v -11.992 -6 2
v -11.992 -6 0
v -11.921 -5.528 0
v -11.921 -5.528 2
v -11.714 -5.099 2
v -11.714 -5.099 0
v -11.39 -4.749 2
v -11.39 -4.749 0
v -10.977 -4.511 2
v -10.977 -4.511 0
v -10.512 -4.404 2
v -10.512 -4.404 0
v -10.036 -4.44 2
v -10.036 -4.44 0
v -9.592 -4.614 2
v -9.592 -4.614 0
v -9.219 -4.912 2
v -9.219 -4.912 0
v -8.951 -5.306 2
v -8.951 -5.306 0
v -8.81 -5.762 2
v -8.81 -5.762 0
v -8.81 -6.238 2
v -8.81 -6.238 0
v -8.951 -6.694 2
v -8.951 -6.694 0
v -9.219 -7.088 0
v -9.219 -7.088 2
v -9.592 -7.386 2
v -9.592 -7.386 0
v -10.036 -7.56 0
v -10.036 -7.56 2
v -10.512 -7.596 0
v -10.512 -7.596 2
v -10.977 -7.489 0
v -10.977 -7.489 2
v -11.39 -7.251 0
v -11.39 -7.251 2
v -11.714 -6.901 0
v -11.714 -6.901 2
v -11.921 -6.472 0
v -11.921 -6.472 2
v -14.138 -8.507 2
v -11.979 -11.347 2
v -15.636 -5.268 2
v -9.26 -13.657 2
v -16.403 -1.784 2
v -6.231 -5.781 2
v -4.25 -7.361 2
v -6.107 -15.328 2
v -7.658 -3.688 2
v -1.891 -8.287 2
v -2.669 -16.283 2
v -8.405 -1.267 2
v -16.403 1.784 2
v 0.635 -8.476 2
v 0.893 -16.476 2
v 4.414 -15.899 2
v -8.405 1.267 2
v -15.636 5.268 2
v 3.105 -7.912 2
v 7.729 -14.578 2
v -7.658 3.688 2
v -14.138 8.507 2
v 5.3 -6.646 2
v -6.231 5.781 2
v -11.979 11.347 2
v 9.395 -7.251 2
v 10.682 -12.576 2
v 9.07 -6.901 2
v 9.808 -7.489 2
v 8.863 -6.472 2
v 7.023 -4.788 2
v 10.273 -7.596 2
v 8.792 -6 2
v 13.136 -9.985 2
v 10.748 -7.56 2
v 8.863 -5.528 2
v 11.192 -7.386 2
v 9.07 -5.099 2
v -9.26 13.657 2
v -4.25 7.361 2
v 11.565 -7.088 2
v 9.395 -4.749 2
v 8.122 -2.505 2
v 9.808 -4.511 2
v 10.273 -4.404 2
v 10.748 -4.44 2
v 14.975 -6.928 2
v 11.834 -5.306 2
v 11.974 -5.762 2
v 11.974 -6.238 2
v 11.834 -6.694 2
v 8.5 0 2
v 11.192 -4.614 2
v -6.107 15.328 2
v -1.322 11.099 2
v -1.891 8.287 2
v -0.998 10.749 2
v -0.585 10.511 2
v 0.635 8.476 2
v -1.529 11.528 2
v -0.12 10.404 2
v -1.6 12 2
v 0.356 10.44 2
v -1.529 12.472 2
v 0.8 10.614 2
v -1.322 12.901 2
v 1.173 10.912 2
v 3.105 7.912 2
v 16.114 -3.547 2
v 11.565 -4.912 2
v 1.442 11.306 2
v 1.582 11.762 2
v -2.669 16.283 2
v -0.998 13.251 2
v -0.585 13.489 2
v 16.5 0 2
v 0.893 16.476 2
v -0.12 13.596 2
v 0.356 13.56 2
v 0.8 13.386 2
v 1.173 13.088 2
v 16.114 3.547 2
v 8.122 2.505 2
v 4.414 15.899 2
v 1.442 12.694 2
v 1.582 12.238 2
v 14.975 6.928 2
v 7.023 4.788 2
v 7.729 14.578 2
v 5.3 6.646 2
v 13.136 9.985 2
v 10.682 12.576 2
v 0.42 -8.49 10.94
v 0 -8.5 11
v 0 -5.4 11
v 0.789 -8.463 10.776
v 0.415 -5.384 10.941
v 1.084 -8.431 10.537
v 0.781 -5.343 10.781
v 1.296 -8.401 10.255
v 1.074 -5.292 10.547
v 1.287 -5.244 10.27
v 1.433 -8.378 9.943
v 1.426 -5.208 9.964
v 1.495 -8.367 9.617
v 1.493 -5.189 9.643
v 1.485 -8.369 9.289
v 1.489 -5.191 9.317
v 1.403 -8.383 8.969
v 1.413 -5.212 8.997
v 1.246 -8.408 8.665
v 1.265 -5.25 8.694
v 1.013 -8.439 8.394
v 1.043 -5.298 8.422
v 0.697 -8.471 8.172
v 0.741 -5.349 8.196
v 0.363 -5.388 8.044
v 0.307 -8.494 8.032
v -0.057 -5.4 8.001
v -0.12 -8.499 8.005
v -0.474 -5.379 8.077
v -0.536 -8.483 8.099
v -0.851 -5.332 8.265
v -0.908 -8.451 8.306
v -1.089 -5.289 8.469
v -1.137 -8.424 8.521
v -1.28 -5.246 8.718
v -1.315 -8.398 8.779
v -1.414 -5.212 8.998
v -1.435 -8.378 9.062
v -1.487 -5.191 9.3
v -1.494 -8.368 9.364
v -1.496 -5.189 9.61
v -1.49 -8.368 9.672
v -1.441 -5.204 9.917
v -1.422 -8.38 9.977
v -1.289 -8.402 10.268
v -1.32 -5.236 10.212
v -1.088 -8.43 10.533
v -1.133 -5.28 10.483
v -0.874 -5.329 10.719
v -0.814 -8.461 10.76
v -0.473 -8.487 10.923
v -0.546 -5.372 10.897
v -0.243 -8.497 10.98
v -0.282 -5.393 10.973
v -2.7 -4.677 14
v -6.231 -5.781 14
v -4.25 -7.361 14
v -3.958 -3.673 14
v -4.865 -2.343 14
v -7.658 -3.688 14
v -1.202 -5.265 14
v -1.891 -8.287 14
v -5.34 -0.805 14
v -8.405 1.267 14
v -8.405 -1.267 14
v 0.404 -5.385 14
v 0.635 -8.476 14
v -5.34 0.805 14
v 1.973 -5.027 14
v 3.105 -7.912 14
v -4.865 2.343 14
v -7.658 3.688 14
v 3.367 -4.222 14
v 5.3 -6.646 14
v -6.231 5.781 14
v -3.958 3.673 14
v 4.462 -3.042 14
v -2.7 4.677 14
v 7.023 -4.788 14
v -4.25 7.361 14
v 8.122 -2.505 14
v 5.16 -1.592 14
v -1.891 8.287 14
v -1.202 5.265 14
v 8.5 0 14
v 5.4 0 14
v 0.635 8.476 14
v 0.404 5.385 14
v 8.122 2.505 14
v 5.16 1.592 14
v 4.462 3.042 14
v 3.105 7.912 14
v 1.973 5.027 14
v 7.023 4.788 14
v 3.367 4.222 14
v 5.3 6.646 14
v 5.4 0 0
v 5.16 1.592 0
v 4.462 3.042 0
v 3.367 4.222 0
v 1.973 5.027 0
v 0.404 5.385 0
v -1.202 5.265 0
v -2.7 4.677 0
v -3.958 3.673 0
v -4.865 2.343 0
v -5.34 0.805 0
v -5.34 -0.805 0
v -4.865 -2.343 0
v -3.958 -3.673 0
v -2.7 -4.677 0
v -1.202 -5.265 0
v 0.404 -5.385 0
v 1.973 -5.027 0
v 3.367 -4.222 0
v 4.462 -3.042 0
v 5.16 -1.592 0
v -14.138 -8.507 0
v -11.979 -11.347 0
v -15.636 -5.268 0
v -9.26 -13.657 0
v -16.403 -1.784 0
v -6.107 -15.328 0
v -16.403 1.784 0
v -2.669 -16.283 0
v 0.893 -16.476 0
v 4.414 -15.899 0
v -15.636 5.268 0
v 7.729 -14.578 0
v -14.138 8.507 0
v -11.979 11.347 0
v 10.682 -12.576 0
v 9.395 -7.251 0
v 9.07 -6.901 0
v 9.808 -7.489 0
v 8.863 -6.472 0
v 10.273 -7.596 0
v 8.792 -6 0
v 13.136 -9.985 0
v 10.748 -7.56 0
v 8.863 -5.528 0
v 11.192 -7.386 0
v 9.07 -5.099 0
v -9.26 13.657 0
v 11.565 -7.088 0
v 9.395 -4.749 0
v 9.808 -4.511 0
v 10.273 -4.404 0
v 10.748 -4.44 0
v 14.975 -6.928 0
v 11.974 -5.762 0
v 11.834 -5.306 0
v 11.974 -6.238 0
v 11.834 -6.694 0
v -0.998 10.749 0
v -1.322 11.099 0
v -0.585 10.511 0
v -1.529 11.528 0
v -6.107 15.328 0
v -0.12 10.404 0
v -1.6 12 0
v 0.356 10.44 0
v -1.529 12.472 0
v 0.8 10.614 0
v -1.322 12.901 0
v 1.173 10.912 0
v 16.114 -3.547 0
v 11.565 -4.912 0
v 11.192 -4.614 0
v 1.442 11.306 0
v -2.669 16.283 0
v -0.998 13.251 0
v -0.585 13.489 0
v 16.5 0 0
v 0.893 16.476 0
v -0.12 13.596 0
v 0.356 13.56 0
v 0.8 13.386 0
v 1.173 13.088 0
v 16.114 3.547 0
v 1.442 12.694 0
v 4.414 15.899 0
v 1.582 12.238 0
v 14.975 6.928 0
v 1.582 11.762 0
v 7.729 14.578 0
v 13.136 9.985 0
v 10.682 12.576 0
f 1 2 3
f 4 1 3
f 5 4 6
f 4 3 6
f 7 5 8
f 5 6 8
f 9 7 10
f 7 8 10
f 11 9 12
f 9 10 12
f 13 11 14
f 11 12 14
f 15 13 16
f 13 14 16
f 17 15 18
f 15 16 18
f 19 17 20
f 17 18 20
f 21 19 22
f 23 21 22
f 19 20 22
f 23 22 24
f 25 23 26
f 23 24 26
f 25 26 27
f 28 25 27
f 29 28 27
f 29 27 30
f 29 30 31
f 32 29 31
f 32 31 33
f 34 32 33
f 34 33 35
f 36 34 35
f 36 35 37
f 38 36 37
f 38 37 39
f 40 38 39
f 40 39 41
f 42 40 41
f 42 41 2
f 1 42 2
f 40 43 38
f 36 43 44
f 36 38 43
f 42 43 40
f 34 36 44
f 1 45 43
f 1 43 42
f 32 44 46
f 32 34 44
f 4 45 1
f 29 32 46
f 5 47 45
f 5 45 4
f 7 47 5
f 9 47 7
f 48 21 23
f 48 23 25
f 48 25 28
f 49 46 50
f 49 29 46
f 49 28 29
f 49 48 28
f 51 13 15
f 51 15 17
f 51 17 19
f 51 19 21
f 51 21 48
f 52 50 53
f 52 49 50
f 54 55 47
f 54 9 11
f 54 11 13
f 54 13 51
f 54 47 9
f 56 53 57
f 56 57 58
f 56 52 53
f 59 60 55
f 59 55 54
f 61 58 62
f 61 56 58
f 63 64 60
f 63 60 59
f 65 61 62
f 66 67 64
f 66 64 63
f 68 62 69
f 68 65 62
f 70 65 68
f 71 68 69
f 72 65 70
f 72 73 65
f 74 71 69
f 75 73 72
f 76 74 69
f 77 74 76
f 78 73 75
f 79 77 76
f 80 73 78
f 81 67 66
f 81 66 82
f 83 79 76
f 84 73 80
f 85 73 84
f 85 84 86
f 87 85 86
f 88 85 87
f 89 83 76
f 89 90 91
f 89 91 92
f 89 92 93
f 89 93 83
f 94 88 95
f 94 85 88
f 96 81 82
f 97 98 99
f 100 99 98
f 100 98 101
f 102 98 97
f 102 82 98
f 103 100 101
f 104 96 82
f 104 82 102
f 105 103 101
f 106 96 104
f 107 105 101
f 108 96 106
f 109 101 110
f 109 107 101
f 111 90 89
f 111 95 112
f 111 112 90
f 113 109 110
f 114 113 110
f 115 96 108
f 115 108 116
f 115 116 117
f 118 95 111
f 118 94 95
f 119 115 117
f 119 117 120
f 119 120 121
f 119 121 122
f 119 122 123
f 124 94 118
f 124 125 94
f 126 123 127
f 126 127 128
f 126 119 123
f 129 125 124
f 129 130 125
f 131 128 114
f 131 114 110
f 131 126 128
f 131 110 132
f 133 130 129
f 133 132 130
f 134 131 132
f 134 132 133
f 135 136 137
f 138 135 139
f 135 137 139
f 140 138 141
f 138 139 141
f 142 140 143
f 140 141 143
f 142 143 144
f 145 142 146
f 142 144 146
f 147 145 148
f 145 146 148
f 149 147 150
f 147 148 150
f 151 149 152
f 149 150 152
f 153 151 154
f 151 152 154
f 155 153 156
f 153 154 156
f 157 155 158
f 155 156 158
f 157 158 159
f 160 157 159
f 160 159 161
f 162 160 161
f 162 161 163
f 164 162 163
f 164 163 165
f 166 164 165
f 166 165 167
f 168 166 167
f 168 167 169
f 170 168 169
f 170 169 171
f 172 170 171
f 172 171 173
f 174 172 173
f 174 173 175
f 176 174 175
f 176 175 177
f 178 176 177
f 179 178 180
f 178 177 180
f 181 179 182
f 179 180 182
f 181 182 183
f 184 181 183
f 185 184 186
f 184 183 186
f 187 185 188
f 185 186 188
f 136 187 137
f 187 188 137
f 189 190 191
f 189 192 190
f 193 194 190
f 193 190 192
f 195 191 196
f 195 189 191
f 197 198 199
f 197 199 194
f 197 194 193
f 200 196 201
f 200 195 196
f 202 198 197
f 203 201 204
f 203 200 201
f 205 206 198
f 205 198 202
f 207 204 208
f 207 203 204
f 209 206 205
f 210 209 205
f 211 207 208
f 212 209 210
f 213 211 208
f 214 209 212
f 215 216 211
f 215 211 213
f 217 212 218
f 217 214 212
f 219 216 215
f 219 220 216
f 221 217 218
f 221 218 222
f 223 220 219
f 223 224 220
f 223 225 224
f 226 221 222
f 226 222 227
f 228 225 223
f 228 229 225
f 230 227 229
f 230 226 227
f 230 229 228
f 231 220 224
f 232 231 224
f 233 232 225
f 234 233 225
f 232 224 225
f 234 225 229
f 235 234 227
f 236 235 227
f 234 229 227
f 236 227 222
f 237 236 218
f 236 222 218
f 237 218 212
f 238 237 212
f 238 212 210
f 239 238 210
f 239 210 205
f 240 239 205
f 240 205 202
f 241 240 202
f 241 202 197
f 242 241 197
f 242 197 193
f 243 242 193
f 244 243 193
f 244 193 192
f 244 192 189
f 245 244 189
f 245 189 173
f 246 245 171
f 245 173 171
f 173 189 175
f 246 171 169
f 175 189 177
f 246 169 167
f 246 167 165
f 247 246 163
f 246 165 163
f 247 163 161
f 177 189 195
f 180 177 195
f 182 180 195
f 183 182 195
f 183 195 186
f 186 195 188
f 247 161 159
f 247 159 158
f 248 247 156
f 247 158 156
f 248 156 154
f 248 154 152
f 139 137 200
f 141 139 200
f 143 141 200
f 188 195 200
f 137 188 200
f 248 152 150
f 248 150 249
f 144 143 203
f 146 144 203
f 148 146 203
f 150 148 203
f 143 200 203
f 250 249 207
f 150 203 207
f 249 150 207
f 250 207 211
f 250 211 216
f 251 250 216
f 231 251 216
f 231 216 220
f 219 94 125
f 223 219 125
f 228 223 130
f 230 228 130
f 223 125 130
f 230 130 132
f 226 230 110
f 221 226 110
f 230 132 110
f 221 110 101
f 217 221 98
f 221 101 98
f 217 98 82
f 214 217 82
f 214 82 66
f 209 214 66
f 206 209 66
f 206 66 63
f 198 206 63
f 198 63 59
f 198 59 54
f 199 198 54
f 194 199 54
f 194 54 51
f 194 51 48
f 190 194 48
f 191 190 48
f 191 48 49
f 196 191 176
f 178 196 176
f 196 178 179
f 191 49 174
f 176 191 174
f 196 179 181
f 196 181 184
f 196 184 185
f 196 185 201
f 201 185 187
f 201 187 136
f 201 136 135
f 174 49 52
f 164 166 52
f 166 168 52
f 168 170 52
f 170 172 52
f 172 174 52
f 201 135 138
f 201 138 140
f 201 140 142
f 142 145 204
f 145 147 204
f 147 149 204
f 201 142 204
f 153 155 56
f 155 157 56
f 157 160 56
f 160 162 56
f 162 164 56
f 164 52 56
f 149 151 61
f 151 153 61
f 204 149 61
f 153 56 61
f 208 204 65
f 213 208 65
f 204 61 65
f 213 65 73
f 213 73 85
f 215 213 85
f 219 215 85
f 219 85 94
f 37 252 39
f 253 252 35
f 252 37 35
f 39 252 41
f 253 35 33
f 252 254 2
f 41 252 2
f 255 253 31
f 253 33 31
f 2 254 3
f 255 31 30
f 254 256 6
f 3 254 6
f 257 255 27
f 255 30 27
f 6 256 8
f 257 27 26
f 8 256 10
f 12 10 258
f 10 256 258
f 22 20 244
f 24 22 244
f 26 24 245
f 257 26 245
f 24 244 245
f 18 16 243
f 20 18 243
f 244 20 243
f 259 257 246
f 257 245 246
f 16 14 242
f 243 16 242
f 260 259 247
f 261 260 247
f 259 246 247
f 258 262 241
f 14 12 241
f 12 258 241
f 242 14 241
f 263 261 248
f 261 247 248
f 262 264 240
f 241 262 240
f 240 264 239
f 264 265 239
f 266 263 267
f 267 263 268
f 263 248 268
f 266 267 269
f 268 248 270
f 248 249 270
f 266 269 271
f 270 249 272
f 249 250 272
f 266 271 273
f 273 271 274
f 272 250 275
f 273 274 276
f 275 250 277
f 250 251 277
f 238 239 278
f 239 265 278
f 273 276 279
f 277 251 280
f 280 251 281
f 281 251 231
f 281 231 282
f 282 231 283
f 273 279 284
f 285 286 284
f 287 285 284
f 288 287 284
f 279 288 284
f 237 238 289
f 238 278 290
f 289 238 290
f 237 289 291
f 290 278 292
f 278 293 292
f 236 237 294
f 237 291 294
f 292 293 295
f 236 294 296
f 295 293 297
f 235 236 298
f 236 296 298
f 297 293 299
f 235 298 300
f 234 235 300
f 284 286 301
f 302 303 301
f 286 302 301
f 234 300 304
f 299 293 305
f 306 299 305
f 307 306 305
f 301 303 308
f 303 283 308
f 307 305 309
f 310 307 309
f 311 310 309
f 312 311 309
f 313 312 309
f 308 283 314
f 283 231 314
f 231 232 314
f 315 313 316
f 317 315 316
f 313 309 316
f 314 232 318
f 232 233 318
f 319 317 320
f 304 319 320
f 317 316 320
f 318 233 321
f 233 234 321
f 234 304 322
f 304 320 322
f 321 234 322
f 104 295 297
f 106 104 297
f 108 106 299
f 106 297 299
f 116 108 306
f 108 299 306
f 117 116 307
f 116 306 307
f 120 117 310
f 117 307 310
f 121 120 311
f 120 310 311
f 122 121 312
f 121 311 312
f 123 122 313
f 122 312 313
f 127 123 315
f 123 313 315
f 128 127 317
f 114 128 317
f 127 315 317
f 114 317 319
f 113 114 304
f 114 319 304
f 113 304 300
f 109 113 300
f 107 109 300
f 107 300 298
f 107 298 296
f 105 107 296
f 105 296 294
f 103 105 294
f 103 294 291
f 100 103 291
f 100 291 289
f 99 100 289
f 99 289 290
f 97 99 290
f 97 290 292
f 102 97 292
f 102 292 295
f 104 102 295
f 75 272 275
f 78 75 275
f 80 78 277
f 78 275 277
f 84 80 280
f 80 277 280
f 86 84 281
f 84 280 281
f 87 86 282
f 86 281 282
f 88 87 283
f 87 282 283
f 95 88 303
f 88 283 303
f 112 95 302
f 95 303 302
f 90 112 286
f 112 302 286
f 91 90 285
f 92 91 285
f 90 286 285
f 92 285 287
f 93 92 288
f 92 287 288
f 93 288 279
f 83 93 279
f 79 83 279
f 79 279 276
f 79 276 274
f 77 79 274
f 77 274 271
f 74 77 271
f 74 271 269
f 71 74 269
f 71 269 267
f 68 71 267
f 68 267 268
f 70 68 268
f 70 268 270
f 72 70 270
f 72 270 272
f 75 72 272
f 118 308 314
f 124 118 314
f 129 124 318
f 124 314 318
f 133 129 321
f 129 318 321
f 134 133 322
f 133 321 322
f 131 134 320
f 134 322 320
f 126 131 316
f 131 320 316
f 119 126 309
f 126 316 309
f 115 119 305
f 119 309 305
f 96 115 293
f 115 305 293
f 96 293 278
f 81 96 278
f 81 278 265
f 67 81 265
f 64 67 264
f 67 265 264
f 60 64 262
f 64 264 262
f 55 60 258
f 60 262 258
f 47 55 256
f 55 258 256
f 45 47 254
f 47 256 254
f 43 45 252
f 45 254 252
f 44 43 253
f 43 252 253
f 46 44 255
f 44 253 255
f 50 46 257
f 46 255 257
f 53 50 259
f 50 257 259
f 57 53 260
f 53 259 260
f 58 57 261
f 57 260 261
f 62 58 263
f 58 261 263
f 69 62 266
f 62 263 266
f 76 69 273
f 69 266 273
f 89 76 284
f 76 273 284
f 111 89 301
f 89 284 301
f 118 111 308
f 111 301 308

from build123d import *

# Parameters (mm, degrees)
SKETCH_1_R          = 16.5
EXTRUDE_1_DEPTH     = 2
SKETCH_2_R          = 8.5
EXTRUDE_2_DEPTH     = 12
SKETCH_3_R          = 5.4
CUT_EXTRUDE_1_DEPTH = 29
SKETCH_4_R          = 1.6
CUT_EXTRUDE_2_DEPTH = 29
CUT_EXTRUDE_3_DEPTH = 12


with BuildPart() as part:
    # 草图1 → 凸台-拉伸1 (new body)
    with BuildSketch(Plane.XY):
        Circle(SKETCH_1_R)
    extrude(amount=EXTRUDE_1_DEPTH)

    # 草图2 → 凸台-拉伸2 (add)
    with BuildSketch(Plane.XY.offset(2)):
        Circle(SKETCH_2_R)
    extrude(amount=EXTRUDE_2_DEPTH)

    # 草图3 → 切除-拉伸1 (cut)
    with BuildSketch(Plane.XY.offset(14)):
        Circle(SKETCH_3_R)
    extrude(amount=-CUT_EXTRUDE_1_DEPTH, mode=Mode.SUBTRACT)

    # 草图4 → 切除-拉伸2 (cut)
    with BuildSketch(Plane(origin=(0, 0, 0), x_dir=(-1, 0, 0), z_dir=(0, 0, -1))):
        with Locations((0, 12)):
            Circle(SKETCH_4_R)
        with Locations((10.392304845, -6)):
            Circle(SKETCH_4_R)
        with Locations((-10.392304845, -6)):
            Circle(SKETCH_4_R)
    extrude(amount=-CUT_EXTRUDE_2_DEPTH, mode=Mode.SUBTRACT)

    # 草图7 → 切除-拉伸3 (cut)
    with BuildSketch(Plane(origin=(0, 0, 0), x_dir=(1, 0, 0), z_dir=(0, 1, 0))):
        with BuildLine():
            ThreePointArc((0, -11), (1.060660172, -10.560660172), (1.5, -9.5))
            ThreePointArc((1.5, -9.5), (-1.060660172, -8.439339828), (0, -11))
        make_face()
    extrude(amount=-CUT_EXTRUDE_3_DEPTH, mode=Mode.SUBTRACT)


solid = part.part
